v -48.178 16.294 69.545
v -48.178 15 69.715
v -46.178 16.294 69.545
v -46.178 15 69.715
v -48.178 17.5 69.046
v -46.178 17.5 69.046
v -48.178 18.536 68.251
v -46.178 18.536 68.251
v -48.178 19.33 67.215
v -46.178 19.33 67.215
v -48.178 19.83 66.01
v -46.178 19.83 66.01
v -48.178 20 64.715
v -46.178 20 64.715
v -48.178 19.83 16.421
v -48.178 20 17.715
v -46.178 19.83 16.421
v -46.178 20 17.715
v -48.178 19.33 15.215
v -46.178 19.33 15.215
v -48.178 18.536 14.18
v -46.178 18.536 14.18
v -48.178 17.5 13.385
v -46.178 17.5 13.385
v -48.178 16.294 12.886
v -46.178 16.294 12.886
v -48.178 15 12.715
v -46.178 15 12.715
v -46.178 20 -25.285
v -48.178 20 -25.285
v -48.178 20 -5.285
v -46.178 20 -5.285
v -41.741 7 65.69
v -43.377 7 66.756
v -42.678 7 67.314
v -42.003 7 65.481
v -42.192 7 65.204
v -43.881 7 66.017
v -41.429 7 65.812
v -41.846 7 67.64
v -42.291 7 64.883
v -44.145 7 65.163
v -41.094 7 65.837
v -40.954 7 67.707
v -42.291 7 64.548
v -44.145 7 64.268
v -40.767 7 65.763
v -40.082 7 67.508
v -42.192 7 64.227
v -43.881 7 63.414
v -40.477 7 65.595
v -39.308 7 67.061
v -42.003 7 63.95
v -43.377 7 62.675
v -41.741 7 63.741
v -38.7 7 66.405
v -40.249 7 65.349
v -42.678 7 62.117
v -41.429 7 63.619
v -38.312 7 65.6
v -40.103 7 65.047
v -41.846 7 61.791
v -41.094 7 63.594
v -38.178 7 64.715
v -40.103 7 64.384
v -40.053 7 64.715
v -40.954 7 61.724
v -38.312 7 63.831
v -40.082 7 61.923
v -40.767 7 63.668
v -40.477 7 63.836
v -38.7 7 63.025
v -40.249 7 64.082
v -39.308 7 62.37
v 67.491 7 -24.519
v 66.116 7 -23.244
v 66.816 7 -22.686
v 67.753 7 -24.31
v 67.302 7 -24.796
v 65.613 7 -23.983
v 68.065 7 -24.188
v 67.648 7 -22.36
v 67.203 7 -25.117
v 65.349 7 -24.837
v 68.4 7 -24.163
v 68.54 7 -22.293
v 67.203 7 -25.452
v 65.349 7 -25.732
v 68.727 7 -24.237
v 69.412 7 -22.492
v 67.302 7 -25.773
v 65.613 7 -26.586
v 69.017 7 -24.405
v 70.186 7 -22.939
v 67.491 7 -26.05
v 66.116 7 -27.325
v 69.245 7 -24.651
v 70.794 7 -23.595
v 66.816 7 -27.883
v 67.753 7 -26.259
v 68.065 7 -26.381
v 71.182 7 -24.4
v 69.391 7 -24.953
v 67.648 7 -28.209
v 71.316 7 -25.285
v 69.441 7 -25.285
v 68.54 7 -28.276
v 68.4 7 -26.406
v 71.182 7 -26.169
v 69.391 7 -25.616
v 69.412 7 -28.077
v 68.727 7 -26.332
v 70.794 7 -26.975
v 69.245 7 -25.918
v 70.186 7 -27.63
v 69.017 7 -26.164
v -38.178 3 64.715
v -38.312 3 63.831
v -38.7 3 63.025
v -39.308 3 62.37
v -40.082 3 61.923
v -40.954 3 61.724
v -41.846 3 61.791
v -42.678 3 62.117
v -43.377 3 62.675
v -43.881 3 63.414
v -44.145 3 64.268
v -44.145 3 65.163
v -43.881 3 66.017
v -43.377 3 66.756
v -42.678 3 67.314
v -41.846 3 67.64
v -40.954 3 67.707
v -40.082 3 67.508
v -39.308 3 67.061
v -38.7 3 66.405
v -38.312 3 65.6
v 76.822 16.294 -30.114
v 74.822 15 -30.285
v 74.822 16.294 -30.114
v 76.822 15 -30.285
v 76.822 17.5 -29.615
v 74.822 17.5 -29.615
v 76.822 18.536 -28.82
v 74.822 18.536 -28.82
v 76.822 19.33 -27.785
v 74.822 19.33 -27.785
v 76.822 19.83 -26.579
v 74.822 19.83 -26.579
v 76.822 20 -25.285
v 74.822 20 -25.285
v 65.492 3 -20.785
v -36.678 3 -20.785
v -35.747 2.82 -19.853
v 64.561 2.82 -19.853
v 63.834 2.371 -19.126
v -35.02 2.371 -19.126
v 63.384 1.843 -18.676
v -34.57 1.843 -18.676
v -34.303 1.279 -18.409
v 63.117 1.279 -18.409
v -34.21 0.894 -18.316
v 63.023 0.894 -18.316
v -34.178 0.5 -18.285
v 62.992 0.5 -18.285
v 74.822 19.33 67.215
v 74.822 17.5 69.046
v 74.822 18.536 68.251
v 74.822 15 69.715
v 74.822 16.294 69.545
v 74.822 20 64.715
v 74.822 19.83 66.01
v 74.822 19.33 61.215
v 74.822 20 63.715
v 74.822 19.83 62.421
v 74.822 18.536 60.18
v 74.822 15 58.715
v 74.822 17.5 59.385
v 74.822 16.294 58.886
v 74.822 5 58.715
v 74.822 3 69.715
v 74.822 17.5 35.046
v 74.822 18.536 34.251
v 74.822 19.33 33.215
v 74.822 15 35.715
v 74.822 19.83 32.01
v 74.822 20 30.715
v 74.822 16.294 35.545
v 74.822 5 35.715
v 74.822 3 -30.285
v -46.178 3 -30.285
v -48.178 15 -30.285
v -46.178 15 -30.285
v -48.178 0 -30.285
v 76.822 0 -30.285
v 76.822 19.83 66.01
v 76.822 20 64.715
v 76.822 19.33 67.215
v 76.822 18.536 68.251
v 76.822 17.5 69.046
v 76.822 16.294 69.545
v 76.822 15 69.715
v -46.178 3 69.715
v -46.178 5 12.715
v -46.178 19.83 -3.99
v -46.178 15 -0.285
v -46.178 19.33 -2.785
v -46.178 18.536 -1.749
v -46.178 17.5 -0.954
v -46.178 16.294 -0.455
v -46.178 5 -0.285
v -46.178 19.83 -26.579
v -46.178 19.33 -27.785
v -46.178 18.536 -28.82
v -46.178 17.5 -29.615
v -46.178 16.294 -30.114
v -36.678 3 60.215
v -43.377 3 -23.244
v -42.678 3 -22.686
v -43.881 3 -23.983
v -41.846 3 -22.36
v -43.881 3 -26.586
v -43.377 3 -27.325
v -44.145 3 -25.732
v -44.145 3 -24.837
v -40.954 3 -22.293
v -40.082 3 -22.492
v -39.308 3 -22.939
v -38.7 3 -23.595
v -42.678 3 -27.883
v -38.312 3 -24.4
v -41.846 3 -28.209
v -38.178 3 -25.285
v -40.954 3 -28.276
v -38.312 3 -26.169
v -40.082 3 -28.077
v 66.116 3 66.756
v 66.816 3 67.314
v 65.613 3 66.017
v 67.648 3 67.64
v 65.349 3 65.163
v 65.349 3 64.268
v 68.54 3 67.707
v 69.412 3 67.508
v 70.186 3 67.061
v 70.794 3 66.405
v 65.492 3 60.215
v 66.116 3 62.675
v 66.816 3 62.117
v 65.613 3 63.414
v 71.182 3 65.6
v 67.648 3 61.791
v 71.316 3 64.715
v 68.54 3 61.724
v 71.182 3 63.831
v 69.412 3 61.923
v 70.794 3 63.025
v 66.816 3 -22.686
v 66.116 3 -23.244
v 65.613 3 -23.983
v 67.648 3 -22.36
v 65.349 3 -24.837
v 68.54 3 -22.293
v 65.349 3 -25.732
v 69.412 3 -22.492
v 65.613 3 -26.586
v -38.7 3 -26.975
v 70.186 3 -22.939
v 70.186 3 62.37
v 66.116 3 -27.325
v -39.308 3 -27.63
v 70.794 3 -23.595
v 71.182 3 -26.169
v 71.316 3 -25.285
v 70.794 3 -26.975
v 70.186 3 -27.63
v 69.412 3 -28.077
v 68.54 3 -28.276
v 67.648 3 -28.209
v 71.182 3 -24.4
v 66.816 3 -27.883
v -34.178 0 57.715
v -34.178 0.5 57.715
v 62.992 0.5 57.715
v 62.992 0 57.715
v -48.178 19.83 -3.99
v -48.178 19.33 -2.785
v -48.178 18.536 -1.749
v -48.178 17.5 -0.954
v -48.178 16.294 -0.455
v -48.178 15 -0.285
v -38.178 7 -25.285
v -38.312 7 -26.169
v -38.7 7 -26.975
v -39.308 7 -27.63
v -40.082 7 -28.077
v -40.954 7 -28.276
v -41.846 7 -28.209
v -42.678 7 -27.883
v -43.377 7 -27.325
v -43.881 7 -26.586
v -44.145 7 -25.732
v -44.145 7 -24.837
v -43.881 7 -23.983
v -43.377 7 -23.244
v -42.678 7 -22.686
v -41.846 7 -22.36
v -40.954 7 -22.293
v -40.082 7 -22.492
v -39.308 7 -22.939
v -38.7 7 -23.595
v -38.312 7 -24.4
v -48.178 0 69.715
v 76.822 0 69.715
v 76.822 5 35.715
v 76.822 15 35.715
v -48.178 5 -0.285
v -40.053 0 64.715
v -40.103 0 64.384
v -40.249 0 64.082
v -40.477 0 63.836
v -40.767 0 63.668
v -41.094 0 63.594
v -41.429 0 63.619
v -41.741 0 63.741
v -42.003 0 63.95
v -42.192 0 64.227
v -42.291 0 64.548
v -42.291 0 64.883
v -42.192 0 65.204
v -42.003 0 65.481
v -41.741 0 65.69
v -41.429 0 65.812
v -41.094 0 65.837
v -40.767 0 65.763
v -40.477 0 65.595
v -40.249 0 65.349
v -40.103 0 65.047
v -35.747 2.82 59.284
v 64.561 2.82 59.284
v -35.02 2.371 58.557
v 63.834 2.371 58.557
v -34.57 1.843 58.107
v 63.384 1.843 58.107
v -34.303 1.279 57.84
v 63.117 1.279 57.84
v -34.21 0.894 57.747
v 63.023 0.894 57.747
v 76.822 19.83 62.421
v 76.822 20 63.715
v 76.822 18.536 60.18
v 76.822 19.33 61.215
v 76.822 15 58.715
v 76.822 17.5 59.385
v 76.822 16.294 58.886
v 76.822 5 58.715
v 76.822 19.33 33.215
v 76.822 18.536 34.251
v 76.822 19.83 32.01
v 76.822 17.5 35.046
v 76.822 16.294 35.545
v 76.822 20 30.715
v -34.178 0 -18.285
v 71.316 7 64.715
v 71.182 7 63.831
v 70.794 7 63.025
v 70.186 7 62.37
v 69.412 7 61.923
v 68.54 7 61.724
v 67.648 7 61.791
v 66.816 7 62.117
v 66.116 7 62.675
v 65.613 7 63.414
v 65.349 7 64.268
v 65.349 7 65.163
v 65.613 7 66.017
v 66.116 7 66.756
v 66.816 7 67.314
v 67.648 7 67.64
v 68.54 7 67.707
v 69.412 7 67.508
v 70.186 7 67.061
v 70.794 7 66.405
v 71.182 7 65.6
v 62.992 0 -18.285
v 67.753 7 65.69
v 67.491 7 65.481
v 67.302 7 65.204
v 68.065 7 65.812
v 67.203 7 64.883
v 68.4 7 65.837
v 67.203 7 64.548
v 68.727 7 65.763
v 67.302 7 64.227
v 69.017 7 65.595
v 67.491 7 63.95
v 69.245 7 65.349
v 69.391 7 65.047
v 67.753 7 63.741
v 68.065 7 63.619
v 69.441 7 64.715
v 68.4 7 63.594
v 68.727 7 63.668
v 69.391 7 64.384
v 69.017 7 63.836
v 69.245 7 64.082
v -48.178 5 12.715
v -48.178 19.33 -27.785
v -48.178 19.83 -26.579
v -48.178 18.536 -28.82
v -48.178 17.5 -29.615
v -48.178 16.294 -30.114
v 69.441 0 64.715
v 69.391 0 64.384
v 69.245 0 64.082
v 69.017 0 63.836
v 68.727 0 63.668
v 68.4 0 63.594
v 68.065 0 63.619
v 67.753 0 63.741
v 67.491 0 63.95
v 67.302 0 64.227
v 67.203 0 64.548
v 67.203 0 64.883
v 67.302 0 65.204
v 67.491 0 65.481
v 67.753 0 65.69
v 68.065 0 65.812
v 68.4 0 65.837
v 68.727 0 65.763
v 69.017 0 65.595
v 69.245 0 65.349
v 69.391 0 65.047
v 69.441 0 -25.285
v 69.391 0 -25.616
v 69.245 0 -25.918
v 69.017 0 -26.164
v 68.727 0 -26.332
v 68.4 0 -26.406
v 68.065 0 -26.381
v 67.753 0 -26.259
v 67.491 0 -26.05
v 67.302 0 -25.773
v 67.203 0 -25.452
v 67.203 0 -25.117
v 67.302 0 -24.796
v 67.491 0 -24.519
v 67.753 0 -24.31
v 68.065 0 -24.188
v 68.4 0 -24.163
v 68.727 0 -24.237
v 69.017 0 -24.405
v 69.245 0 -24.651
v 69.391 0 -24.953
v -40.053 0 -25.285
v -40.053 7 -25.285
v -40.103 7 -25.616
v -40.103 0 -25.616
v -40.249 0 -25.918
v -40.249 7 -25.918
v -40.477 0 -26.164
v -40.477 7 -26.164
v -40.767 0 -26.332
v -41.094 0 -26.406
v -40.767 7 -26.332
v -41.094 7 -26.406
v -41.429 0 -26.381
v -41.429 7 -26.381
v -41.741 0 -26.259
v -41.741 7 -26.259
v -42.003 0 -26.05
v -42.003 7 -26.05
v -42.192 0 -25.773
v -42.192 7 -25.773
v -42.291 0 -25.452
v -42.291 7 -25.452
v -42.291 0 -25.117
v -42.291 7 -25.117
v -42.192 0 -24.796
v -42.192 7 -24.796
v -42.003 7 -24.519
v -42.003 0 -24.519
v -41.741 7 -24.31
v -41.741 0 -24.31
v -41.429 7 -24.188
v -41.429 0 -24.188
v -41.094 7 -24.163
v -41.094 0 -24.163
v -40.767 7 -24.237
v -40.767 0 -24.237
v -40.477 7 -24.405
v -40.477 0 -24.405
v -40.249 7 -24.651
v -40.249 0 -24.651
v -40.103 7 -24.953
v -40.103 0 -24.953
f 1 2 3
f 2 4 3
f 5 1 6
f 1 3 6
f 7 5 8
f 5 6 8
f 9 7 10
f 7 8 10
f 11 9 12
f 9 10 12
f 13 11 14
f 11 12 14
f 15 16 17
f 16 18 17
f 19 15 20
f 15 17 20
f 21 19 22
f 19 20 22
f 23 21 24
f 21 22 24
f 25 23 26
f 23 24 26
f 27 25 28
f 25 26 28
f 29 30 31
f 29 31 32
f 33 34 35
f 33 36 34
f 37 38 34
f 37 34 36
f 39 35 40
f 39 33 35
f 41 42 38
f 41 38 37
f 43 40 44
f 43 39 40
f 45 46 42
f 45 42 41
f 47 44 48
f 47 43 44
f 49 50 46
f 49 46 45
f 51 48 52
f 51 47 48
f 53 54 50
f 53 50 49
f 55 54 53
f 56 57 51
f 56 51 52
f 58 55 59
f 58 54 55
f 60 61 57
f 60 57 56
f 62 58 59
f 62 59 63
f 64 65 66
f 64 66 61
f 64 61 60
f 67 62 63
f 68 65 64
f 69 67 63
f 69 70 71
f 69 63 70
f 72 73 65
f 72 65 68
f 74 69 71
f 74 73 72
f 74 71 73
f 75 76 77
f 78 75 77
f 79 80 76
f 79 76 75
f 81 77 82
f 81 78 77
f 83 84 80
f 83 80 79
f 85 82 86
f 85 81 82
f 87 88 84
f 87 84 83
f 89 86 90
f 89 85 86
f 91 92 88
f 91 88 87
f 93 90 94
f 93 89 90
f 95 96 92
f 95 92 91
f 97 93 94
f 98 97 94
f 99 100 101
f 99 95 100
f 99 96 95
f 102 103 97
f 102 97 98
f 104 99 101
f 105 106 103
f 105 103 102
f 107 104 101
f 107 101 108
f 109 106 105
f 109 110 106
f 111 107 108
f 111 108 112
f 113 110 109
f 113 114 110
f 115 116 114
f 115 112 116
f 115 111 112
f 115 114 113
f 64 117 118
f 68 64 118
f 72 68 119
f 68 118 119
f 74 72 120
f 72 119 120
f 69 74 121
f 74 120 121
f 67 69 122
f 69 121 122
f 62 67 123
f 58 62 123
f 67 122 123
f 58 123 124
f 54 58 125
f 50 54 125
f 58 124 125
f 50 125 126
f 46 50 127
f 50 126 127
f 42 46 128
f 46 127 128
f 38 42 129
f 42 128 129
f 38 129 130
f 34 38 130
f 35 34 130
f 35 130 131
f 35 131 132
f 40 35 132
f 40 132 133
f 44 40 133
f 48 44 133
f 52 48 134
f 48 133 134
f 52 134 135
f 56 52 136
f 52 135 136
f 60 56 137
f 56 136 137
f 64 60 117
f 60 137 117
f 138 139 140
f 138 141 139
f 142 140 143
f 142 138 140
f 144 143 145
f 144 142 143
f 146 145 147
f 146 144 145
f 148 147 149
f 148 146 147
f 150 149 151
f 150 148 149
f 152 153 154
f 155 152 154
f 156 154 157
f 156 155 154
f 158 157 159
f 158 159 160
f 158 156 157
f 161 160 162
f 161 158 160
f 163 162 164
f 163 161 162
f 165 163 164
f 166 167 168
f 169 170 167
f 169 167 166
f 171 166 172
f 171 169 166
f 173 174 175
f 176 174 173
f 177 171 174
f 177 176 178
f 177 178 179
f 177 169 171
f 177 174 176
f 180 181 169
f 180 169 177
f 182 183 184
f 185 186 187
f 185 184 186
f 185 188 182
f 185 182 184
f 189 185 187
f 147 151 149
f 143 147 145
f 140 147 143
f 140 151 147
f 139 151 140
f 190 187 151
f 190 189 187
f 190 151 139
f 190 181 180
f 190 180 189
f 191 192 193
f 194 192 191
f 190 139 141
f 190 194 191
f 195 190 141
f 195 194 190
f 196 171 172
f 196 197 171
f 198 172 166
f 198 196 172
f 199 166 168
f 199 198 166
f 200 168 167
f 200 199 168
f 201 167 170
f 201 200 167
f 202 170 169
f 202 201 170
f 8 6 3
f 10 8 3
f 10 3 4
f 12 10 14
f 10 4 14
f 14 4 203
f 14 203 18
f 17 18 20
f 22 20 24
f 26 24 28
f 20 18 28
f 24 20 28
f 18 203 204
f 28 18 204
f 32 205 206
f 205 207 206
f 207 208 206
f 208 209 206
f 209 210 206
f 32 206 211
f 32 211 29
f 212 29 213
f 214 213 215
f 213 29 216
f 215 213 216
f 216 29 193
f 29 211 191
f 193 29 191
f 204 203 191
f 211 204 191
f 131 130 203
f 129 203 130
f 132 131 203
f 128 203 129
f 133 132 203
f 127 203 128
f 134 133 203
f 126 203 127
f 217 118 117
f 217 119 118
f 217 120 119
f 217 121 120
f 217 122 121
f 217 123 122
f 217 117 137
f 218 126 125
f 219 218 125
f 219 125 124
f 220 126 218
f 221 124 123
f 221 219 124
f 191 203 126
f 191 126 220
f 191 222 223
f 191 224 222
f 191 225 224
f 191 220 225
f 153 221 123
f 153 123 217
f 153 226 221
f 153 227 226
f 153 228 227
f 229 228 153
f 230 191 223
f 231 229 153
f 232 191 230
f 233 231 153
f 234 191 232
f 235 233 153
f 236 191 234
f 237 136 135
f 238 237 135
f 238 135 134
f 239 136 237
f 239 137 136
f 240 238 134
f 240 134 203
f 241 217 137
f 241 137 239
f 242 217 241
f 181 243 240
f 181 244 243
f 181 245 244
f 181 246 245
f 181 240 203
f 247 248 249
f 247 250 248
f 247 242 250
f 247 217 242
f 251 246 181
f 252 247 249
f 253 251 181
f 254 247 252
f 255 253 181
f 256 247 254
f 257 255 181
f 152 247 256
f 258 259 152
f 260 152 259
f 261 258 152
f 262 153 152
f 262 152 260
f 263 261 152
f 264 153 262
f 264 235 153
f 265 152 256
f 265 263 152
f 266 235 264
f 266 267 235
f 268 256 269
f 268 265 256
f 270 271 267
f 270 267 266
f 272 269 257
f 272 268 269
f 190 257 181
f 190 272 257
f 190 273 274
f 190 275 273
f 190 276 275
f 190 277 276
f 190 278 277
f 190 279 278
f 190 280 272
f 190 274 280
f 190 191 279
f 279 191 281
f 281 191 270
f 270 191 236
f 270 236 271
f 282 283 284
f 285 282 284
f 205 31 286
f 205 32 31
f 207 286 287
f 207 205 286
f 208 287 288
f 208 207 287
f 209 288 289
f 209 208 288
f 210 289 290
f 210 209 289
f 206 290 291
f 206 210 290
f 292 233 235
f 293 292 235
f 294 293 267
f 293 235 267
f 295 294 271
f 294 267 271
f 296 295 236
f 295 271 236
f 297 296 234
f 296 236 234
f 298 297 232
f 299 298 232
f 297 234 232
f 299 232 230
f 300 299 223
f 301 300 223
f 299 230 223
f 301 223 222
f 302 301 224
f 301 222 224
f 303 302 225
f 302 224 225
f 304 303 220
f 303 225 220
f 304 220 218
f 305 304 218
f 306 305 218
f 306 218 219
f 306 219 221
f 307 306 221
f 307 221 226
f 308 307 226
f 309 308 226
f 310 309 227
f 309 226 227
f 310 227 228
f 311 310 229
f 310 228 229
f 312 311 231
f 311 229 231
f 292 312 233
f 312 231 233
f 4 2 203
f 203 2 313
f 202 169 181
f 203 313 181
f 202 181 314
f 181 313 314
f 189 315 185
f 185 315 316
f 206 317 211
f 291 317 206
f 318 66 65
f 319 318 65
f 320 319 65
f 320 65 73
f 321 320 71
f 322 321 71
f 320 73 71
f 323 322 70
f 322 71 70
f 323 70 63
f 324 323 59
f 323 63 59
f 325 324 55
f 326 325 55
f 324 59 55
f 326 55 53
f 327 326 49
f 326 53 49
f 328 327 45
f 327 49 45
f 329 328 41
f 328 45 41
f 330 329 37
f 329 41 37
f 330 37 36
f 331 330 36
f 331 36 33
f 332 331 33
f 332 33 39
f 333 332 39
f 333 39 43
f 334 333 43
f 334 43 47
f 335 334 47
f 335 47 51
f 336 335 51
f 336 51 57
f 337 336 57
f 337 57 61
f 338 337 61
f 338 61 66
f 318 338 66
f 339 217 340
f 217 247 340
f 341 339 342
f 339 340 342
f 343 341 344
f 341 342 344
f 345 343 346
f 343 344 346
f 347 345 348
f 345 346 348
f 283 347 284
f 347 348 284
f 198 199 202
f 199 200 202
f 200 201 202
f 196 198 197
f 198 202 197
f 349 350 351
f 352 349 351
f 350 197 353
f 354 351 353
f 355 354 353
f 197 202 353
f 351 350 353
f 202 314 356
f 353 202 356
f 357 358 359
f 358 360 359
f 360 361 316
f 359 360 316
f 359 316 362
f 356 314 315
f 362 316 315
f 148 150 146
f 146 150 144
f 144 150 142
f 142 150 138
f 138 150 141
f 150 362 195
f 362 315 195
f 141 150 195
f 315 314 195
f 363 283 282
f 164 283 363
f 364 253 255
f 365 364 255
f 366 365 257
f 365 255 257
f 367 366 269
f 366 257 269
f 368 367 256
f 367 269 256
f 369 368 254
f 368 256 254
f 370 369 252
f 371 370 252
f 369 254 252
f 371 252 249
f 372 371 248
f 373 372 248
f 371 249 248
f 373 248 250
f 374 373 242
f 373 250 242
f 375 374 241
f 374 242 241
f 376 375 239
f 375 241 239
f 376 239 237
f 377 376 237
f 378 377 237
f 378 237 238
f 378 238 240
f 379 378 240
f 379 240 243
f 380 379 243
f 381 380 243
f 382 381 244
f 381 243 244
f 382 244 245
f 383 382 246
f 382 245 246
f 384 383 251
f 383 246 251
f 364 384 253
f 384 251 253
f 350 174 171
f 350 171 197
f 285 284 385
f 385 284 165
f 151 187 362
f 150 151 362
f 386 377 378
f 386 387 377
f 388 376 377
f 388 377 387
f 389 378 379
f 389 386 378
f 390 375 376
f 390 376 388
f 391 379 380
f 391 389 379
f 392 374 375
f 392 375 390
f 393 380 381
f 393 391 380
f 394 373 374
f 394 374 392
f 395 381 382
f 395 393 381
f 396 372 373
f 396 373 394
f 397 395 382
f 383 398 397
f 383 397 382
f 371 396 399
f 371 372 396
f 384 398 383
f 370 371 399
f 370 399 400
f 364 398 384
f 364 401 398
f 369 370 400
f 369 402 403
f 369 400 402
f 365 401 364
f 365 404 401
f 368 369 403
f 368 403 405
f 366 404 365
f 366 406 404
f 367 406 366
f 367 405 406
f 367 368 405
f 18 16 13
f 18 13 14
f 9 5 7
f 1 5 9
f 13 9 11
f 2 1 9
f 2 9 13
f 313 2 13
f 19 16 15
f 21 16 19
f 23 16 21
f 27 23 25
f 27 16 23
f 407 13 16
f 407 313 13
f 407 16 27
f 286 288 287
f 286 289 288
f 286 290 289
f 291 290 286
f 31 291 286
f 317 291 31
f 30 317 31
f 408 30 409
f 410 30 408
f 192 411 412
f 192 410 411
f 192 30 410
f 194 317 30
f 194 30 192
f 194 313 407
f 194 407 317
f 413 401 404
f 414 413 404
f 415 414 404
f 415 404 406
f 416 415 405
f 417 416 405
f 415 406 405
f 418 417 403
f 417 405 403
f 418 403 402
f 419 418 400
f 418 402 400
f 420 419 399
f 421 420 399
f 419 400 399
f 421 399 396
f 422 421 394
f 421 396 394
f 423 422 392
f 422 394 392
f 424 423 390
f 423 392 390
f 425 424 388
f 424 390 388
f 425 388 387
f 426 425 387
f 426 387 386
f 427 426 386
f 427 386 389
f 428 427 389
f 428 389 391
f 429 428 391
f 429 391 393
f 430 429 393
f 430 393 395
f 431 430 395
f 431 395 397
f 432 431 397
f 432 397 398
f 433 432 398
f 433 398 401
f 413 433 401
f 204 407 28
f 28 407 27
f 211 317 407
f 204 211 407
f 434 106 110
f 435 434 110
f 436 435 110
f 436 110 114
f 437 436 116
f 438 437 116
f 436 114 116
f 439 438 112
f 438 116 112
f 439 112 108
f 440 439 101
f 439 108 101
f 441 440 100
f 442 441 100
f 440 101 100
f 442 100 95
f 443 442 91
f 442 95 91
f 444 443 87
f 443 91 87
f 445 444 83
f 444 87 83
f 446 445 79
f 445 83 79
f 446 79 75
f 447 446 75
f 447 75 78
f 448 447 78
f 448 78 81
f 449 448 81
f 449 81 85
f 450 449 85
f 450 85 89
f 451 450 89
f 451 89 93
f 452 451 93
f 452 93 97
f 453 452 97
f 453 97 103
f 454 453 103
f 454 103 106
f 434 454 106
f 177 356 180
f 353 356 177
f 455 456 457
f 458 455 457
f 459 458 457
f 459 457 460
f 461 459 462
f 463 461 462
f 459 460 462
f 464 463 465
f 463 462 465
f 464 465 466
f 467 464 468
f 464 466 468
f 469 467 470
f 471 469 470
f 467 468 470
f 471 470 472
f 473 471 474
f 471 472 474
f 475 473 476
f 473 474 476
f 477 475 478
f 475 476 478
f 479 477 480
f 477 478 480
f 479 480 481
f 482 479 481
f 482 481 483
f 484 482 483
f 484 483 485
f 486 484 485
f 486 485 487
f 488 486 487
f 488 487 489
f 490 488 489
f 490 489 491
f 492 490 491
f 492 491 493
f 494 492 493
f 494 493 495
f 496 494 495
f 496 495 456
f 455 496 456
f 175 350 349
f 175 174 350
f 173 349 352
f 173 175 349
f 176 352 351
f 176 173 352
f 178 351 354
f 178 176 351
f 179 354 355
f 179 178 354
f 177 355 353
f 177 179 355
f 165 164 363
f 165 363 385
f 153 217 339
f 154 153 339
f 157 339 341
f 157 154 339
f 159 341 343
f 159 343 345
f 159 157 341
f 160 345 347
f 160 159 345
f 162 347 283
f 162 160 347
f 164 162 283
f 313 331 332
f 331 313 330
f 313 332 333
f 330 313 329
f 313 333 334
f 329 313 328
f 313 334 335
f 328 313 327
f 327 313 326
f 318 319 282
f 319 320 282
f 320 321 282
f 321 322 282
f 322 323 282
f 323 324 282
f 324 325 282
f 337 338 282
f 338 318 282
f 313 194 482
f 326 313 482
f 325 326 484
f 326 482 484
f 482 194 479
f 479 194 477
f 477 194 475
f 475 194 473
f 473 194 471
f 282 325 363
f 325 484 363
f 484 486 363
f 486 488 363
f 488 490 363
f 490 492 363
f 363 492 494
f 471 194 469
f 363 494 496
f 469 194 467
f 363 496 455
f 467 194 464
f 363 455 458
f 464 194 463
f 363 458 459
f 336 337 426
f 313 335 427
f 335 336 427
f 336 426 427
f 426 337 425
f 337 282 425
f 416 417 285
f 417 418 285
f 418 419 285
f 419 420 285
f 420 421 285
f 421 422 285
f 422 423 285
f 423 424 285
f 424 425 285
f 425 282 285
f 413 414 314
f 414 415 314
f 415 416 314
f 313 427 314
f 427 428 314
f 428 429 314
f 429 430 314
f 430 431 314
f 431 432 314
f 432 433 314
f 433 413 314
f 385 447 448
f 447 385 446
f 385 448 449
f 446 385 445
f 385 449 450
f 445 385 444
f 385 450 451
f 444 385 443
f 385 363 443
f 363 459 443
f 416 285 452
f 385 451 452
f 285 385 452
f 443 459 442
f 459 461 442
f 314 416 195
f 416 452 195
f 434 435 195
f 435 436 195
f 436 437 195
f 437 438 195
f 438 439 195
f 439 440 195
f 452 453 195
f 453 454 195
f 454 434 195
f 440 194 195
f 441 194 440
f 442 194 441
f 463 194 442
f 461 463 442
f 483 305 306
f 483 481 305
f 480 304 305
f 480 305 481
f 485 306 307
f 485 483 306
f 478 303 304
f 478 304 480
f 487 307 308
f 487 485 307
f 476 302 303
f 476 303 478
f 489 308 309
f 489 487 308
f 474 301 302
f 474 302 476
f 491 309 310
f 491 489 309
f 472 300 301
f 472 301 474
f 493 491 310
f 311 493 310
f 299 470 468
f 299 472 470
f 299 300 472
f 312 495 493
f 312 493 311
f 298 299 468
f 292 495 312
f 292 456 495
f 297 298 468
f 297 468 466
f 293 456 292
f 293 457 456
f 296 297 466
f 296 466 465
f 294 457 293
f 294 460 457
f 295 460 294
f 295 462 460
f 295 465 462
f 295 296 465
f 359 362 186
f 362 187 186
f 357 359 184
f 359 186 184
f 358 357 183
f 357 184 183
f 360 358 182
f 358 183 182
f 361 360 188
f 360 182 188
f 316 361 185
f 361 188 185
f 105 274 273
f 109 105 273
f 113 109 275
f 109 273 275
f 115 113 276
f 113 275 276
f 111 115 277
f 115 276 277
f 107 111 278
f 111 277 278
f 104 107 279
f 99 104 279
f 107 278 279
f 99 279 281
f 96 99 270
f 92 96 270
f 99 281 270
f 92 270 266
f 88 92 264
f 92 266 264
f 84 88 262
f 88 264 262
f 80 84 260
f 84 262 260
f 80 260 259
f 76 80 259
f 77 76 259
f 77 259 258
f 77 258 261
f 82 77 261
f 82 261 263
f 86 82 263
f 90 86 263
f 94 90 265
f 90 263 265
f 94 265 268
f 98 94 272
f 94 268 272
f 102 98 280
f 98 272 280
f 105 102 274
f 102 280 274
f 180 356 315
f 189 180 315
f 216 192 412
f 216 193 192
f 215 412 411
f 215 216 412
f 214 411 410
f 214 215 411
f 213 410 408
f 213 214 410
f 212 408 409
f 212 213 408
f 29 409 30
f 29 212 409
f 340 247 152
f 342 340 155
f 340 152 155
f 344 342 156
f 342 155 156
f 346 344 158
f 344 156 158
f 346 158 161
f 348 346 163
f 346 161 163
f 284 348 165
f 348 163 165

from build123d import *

# Parameters (mm, degrees)
SKETCH1_W           = 125
SKETCH1_H           = 100
BOSS_EXTRUDE1_DEPTH = 3
SKETCH2_W           = 2
SKETCH2_H           = 100
BOSS_EXTRUDE2_DEPTH = 17
SKETCH3_R           = 3
BOSS_EXTRUDE4_DEPTH = 4
SKETCH4_W           = 13
SKETCH4_H           = 15
CUT_EXTRUDE1_DEPTH  = 2
SKETCH5_W           = 23
SKETCH5_H           = 15
CUT_EXTRUDE2_DEPTH  = 2
SKETCH6_R           = 1.125
CUT_EXTRUDE3_DEPTH  = 22
FILLET1_R           = 5
FILLET2_R           = 5
SKETCH7_W           = 97.170339499
SKETCH7_H           = 76
CUT_EXTRUDE4_DEPTH  = 22
FILLET3_R           = 2.5


with BuildPart() as part:
    # Sketch1 → Boss-Extrude1 (new body)
    with BuildSketch(Plane(origin=(0, 0, 0), x_dir=(1, 0, 0), z_dir=(0, 1, 0))):
        with Locations((14.321748602, -19.715443405)):
            Rectangle(SKETCH1_W, SKETCH1_H)
    extrude(amount=BOSS_EXTRUDE1_DEPTH)

    # Sketch2 → Boss-Extrude2 (add)
    with BuildSketch(Plane(origin=(0, 3, 0), x_dir=(1, 0, 0), z_dir=(0, 1, 0))):
        with Locations((75.821748602, -19.715443405)):
            Rectangle(SKETCH2_W, SKETCH2_H)
        with Locations((-47.178251398, -19.715443405)):
            Rectangle(SKETCH2_W, SKETCH2_H)
    extrude(amount=BOSS_EXTRUDE2_DEPTH)

    # Sketch3 → Boss-Extrude4 (add)
    with BuildSketch(Plane(origin=(0, 3, 0), x_dir=(1, 0, 0), z_dir=(0, 1, 0))):
        with Locations((-41.178251398, -64.715443405)):
            Circle(SKETCH3_R)
        with Locations((-41.178251398, 25.284556595)):
            Circle(SKETCH3_R)
        with Locations((68.315618549, 25.284556595)):
            Circle(SKETCH3_R)
        with Locations((68.315618549, -64.715443405)):
            Circle(SKETCH3_R)
    extrude(amount=BOSS_EXTRUDE4_DEPTH)

    # Sketch4 → Cut-Extrude1 (cut)
    with BuildSketch(Plane.ZY.offset(48.178251398)):
        with Locations((6.215443405, 12.5)):
            Rectangle(SKETCH4_W, SKETCH4_H)
    extrude(amount=-CUT_EXTRUDE1_DEPTH, mode=Mode.SUBTRACT)

    # Sketch5 → Cut-Extrude2 (cut)
    with BuildSketch(Plane(origin=(76.821748602, 0, 0), x_dir=(0, 0, -1), z_dir=(1, 0, 0))):
        with Locations((-47.215443405, 12.5)):
            Rectangle(SKETCH5_W, SKETCH5_H)
    extrude(amount=-CUT_EXTRUDE2_DEPTH, mode=Mode.SUBTRACT)

    # Sketch6 → Cut-Extrude3 (cut)
    with BuildSketch(Plane(origin=(0, 7, 0), x_dir=(1, 0, 0), z_dir=(0, 1, 0))):
        with Locations((-41.178251398, -64.715443405)):
            Circle(SKETCH6_R)
        with Locations((-41.178251398, 25.284556595)):
            Circle(SKETCH6_R)
        with Locations((68.315618549, -64.715443405)):
            Circle(SKETCH6_R)
        with Locations((68.315618549, 25.284556595)):
            Circle(SKETCH6_R)
    extrude(amount=-CUT_EXTRUDE3_DEPTH, mode=Mode.SUBTRACT)

    # Fillet1
    fillet1_edges = [part.edges().sort_by_distance(p)[0] for p in [
        (75.821748602, 20, 69.715443405),
        (-47.178251398, 20, 69.715443405),
        (-47.178251398, 20, -30.284556595),
        (75.821748602, 20, -30.284556595),
    ]]
    fillet(fillet1_edges, radius=FILLET1_R)

    # Fillet2
    fillet2_edges = [part.edges().sort_by_distance(p)[0] for p in [
        (-47.178251398, 20, -0.284556595),
        (-47.178251398, 20, 12.715443405),
        (75.821748602, 20, 58.715443405),
        (75.821748602, 20, 35.715443405),
    ]]
    fillet(fillet2_edges, radius=FILLET2_R)

    # Sketch7 → Cut-Extrude4 (cut)
    with BuildSketch(Plane(origin=(0, 3, 0), x_dir=(1, 0, 0), z_dir=(0, 1, 0))):
        with Locations((14.406918352, -19.715443405)):
            Rectangle(SKETCH7_W, SKETCH7_H)
    extrude(amount=-CUT_EXTRUDE4_DEPTH, mode=Mode.SUBTRACT)

    # Fillet3
    fillet3_edges = [part.edges().sort_by_distance(p)[0] for p in [
        (62.992088101, 3, 19.715443405),
        (14.406918351, 3, -18.284556595),
        (-34.178251398, 3, 19.715443405),
        (14.406918351, 3, 57.715443405),
    ]]
    fillet(fillet3_edges, radius=FILLET3_R)


solid = part.part
